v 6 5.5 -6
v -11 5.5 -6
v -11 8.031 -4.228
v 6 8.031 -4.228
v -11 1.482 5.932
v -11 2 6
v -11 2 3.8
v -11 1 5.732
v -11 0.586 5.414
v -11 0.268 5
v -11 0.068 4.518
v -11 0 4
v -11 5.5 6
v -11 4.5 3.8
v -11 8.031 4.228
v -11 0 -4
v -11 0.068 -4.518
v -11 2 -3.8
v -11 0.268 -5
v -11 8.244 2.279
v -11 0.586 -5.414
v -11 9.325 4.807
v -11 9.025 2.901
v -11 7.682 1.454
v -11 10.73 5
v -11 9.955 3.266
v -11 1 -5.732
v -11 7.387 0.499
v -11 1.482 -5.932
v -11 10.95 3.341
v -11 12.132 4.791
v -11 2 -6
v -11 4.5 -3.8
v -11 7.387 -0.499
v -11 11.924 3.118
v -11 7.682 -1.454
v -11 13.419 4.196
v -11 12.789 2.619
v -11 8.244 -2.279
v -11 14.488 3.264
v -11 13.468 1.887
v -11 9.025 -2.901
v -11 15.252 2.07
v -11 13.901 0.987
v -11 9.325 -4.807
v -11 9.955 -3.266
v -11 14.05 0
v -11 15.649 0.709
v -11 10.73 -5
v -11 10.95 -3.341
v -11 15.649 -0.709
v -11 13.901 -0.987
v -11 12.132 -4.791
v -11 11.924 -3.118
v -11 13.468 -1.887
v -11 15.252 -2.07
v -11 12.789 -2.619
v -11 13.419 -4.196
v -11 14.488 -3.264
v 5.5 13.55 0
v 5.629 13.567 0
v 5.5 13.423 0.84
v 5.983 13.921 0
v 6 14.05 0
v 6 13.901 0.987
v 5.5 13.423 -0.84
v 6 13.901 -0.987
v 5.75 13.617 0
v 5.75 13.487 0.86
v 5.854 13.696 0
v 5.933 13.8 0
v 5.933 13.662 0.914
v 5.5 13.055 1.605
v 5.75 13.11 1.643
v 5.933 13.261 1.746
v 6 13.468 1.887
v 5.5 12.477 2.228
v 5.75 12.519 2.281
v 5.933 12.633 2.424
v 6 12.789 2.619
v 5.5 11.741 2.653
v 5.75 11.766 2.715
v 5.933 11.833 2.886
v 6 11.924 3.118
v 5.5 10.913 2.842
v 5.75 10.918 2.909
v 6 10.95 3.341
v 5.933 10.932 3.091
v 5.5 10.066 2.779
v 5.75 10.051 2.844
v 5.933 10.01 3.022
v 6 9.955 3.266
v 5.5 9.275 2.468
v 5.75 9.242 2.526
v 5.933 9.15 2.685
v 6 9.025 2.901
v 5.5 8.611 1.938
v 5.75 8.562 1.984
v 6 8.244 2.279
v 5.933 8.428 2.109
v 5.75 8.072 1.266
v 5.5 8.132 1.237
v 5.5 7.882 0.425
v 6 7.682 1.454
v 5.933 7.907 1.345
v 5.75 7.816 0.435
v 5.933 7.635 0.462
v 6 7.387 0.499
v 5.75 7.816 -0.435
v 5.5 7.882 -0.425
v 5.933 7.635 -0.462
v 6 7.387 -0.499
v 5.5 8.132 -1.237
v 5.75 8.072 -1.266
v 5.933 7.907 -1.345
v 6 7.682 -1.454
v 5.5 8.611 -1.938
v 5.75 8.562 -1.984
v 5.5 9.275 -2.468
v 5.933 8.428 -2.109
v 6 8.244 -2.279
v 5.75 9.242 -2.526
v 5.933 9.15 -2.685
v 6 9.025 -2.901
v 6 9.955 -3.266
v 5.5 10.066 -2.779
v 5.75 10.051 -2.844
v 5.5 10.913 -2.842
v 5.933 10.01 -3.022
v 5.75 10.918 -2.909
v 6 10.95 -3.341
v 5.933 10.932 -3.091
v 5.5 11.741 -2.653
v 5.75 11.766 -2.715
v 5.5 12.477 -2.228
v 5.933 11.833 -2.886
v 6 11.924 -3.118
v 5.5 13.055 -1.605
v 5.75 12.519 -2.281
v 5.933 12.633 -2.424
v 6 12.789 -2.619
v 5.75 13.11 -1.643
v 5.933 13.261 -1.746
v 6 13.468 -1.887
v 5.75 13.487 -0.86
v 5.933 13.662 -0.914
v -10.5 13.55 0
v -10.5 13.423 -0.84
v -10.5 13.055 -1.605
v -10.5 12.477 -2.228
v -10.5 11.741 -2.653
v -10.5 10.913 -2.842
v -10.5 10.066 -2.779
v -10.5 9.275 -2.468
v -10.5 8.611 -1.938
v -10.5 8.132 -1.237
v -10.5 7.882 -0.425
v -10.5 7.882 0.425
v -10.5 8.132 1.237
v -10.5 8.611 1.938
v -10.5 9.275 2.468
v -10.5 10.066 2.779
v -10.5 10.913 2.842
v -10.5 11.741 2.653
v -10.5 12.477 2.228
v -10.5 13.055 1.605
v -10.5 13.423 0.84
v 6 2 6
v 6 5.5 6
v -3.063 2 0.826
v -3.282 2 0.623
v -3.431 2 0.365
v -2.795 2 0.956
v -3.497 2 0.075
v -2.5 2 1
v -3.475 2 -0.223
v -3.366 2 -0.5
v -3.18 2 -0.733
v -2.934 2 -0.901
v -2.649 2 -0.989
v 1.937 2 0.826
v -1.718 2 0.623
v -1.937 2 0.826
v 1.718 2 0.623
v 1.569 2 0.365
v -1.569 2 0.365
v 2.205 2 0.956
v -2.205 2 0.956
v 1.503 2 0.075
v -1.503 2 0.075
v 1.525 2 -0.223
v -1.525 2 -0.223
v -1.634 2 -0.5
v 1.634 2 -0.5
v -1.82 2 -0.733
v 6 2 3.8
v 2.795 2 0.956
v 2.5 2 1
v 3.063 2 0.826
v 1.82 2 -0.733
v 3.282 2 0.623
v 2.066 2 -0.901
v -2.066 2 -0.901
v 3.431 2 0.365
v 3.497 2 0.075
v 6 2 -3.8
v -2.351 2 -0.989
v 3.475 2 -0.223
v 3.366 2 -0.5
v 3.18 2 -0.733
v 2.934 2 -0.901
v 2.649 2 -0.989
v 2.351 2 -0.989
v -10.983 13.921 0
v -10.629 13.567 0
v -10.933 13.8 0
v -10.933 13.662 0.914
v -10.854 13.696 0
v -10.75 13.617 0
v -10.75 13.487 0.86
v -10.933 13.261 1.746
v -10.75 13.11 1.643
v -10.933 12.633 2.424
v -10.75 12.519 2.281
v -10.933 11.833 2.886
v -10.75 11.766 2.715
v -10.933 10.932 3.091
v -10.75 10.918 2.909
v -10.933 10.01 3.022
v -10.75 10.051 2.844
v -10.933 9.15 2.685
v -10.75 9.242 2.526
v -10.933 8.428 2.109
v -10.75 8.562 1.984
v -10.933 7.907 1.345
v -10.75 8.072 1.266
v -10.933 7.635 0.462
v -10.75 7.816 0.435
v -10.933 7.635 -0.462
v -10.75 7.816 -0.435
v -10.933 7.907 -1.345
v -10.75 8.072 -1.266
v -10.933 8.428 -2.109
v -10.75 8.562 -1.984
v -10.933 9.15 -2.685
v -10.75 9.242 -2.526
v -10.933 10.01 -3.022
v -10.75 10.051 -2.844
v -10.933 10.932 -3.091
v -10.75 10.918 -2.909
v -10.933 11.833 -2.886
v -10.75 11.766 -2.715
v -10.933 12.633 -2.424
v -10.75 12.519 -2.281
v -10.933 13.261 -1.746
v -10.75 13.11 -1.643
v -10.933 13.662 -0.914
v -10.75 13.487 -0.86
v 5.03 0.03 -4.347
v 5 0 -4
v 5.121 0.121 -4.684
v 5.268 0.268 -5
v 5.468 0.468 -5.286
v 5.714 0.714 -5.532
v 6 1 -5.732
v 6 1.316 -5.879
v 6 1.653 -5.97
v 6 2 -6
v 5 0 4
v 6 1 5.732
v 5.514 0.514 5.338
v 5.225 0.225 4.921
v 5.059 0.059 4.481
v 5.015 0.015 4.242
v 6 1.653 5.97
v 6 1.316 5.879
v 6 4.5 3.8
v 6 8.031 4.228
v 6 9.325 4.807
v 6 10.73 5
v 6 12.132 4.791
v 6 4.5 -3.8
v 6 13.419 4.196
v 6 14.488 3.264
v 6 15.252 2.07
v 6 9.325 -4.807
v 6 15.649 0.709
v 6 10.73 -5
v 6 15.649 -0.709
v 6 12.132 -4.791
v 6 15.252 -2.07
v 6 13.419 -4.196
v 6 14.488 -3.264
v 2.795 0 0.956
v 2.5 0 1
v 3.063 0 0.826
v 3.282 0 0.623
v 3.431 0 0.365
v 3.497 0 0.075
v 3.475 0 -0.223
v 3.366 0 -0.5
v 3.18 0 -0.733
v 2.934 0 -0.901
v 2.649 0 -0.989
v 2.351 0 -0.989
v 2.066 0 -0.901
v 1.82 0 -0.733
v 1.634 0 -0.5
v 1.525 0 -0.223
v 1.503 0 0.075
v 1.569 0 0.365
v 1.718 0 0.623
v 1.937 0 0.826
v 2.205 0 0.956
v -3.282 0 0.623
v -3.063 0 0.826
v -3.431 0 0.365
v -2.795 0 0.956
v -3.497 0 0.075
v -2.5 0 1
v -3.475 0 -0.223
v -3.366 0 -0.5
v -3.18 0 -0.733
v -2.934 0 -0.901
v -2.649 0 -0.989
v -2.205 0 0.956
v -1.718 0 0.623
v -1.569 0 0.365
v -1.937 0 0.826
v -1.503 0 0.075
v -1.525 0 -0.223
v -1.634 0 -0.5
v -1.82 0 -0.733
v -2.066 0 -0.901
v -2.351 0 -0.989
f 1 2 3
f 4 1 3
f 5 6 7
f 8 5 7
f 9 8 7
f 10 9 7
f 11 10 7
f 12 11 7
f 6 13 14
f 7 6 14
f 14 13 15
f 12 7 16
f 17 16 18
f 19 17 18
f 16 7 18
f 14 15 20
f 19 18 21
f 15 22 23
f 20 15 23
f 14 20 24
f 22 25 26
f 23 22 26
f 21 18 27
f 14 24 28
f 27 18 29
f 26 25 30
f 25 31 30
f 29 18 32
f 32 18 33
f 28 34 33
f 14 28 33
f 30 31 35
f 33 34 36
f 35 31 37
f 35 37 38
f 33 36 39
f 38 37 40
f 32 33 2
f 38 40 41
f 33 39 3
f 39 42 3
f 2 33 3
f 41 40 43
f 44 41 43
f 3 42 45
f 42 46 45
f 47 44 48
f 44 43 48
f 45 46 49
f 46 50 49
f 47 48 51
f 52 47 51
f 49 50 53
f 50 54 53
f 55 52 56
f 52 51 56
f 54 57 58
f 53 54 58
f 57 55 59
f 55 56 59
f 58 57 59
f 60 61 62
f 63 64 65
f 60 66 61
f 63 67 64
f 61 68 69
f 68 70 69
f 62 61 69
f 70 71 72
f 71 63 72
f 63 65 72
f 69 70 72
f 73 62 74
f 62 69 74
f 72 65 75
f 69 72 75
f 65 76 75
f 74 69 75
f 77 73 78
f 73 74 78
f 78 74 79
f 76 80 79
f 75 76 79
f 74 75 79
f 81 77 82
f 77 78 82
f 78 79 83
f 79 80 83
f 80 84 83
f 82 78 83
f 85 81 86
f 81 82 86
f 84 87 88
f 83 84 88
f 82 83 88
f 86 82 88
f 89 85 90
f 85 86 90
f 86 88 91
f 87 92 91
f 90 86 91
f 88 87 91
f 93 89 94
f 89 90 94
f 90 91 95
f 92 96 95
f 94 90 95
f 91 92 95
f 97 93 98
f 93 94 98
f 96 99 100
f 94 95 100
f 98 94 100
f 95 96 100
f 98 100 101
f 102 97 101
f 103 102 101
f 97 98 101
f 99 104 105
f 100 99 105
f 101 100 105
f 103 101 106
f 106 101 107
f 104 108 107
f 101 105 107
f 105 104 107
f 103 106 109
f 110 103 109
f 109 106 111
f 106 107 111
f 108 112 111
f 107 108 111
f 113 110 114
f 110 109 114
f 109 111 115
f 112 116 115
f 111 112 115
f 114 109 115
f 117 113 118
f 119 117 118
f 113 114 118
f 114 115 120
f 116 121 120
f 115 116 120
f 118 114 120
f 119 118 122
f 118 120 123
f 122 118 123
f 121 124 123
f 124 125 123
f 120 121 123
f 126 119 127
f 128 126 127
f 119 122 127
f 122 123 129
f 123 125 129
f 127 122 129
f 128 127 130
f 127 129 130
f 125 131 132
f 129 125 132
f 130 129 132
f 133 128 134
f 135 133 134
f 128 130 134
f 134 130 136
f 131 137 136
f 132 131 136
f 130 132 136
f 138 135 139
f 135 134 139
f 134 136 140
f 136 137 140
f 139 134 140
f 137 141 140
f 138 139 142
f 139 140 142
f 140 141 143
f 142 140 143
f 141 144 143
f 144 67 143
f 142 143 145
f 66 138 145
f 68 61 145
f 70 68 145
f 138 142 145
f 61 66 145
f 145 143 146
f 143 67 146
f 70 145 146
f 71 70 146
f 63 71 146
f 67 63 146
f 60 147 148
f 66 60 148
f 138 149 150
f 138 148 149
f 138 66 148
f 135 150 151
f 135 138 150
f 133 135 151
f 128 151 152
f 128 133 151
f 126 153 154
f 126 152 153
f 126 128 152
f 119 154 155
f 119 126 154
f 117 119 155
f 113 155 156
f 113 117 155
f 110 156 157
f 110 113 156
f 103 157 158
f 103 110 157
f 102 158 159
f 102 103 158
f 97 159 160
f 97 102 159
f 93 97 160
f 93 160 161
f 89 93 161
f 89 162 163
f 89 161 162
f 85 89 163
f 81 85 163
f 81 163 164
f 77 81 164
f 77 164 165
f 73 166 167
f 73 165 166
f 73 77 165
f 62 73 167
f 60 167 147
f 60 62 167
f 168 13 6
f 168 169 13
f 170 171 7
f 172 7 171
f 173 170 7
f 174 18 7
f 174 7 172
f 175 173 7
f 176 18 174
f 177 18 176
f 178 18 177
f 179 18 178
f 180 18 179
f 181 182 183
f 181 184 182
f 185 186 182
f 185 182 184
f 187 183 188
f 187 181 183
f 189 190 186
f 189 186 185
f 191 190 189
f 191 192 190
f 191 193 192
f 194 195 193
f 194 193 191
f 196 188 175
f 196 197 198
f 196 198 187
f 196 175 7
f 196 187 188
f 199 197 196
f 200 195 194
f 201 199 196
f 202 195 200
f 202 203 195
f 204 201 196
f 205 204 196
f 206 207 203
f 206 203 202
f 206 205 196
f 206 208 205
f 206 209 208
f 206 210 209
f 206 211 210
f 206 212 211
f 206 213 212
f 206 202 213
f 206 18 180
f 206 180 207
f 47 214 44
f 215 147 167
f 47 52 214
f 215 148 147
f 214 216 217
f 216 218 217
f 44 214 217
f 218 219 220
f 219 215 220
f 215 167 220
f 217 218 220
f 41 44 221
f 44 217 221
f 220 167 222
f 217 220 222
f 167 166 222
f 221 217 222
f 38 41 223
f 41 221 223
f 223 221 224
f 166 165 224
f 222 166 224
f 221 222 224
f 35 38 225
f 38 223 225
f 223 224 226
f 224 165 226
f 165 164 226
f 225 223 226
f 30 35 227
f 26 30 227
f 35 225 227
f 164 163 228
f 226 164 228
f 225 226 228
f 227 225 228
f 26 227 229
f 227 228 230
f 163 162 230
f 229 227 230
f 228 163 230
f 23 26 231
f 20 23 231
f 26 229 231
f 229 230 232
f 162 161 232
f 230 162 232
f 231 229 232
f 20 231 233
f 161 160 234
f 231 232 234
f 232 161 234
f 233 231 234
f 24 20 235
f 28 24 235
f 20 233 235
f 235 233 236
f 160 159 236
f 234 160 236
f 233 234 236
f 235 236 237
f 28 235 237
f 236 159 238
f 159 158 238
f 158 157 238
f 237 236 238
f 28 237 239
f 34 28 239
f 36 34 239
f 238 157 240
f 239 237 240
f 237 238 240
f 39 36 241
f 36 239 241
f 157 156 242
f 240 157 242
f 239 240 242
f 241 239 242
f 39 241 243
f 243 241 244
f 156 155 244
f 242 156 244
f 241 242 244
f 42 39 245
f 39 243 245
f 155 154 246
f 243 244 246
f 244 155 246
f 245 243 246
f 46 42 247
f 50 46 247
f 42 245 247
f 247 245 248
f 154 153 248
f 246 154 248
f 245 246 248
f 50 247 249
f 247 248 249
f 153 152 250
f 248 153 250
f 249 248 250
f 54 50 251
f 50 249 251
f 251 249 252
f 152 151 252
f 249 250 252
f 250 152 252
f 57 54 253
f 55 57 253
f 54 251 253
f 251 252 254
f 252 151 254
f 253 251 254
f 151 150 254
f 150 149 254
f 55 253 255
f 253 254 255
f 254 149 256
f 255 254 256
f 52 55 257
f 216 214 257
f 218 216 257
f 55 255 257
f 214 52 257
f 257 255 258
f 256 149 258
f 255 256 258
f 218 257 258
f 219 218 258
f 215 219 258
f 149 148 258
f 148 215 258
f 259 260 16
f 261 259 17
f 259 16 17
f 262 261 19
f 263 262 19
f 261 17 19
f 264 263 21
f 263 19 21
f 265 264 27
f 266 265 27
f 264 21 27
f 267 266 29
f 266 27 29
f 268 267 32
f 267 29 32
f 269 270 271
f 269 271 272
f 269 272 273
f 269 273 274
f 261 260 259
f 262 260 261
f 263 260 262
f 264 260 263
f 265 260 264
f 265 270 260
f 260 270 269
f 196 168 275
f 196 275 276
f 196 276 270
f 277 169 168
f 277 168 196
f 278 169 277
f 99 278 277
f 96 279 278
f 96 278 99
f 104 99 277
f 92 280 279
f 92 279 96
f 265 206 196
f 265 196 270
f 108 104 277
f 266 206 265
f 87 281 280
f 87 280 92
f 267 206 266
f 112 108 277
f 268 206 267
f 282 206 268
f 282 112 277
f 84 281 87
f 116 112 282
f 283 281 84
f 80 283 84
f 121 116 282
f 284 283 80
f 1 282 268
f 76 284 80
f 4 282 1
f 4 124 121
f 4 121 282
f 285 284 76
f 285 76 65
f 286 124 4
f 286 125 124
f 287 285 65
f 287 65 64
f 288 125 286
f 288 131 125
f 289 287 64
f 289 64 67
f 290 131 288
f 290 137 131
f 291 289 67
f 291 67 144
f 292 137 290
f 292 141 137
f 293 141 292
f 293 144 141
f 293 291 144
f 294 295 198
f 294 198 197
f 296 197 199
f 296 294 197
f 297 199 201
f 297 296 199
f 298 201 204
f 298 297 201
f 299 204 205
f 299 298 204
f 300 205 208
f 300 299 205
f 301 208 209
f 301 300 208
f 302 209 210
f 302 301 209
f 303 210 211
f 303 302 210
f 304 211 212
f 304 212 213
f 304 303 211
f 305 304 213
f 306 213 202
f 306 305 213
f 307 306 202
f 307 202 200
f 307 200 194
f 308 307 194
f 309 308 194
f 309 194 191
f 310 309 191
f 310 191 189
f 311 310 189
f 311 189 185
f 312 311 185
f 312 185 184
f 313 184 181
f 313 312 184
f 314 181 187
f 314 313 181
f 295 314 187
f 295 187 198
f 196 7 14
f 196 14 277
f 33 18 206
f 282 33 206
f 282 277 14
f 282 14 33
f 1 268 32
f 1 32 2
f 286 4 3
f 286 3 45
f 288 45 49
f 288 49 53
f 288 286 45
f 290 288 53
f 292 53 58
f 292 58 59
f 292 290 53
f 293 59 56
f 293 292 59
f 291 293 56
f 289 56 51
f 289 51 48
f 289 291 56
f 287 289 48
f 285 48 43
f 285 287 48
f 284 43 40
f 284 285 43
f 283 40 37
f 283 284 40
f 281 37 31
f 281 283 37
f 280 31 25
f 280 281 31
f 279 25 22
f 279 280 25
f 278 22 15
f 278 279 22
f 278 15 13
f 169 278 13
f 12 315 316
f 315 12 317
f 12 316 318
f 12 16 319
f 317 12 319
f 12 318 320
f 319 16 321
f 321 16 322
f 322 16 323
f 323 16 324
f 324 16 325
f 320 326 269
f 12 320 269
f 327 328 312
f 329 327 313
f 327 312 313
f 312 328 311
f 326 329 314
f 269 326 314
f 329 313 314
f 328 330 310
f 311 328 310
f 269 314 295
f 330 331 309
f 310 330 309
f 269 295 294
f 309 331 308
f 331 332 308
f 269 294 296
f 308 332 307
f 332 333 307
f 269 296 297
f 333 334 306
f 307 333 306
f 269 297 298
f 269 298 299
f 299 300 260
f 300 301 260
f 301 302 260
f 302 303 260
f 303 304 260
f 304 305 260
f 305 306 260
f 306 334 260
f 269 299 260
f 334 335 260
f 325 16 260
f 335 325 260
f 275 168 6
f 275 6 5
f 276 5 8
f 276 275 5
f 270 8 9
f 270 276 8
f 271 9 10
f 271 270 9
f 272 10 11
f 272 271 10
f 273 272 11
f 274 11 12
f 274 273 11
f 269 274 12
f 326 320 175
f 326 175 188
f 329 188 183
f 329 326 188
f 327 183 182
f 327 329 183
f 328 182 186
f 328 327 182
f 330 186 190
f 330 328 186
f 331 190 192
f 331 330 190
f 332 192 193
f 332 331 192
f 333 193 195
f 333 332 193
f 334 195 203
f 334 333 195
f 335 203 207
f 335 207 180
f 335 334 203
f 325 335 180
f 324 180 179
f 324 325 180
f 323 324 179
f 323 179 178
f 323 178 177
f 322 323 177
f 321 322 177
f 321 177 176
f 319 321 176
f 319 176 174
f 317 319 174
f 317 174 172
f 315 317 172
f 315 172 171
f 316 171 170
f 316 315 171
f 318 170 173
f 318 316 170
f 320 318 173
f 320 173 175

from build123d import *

# Parameters (mm, degrees)
SKETCH_1_W      = 12
SKETCH_1_H      = 12
SKETCH_1_R      = 1
SKETCH_1_W_2    = 5
EXTRUDE_1_DEPTH = 2
SKETCH_2_W      = 17
SKETCH_2_H      = 2.2
EXTRUDE_2_DEPTH = 2.5
EXTRUDE_3_DEPTH = 17
CHAMFER_1_SIZE  = 1
FILLET_4_R      = 2


with BuildPart() as part:
    # 草图1 → 凸台-拉伸1 (new body)
    # profile 1 of 2: a face of its own
    with BuildSketch(Plane(origin=(0, 0, 0), x_dir=(1, 0, 0), z_dir=(0, 1, 0))):
        Rectangle(SKETCH_1_W, SKETCH_1_H)
        with Locations(Location((2.5, 0, 0), (0, 0, 270))):
            Circle(SKETCH_1_R, mode=Mode.SUBTRACT)
        with Locations(Location((-2.5, 0, 0), (0, 0, 270))):
            Circle(SKETCH_1_R, mode=Mode.SUBTRACT)
    # profile 2 of 2: a face of its own
    with BuildSketch(Plane(origin=(0, 0, 0), x_dir=(1, 0, 0), z_dir=(0, 1, 0))):
        with Locations((-8.5, 0)):
            Rectangle(SKETCH_1_W_2, SKETCH_1_H)
    extrude(amount=EXTRUDE_1_DEPTH)

    # 草图2 → 凸台-拉伸2 (add)
    with BuildSketch(Plane(origin=(0, 2, 0), x_dir=(1, 0, 0), z_dir=(0, 1, 0))):
        with Locations((-2.5, 4.9)):
            Rectangle(SKETCH_2_W, SKETCH_2_H)
        with Locations((-2.5, -4.9)):
            Rectangle(SKETCH_2_W, SKETCH_2_H)
    extrude(amount=EXTRUDE_2_DEPTH)

    # 草图4 → 凸台-拉伸3 (add)
    with BuildSketch(Plane(origin=(6, 0, 0), x_dir=(0, 0, -1), z_dir=(1, 0, 0))):
        with BuildLine():
            Line((-6, 5.5), (-6, 4.5))
            Line((-6, 4.5), (6, 4.5))
            Line((6, 4.5), (6, 5.5))
            Line((6, 5.5), (4.227921486, 8.030790397))
            ThreePointArc((4.227921486, 8.030790397), (0, 15.7), (-4.227921486, 8.030790397))
            Line((-4.227921486, 8.030790397), (-6, 5.5))
        make_face()
        with BuildLine():
            ThreePointArc((0, 7.85), (-2.85, 10.7), (0, 13.55))
            ThreePointArc((0, 13.55), (2.85, 10.7), (0, 7.85))
        make_face(mode=Mode.SUBTRACT)
    extrude(amount=-EXTRUDE_3_DEPTH)

    # 圆角1: read off the stored shape, not the designer's step
    # 圆角1 outline → 圆角1 (revolve, cut)
    with BuildSketch(Plane(origin=(0, 10.7, 0), x_dir=(0, 1, 0), z_dir=(0, 0, -1))):
        with BuildLine():
            Line((2.85, 6), (2.85, 5.5))
            ThreePointArc((2.85, 5.5), (2.996446609, 5.853553391), (3.35, 6))
            Line((3.35, 6), (2.85, 6))
        make_face()
        with BuildLine():
            ThreePointArc((3.35, -11), (2.996446609, -10.853553391), (2.85, -10.5))
            Line((2.85, -10.5), (2.85, -11))
            Line((2.85, -11), (3.35, -11))
        make_face()
    revolve(axis=Axis((0, 10.7, 0), (1, 0, 0)), mode=Mode.SUBTRACT)

    # 倒角1
    chamfer_1_edges = [part.edges().sort_by_distance(p)[0] for p in [
        (6, 0, 0),
    ]]
    chamfer(chamfer_1_edges, length=CHAMFER_1_SIZE)

    # 圆角4
    fillet_4_edges = [part.edges().sort_by_distance(p)[0] for p in [
        (-3, 0, -6),
        (-3, 0, 6),
    ]]
    fillet(fillet_4_edges, radius=FILLET_4_R)


solid = part.part
